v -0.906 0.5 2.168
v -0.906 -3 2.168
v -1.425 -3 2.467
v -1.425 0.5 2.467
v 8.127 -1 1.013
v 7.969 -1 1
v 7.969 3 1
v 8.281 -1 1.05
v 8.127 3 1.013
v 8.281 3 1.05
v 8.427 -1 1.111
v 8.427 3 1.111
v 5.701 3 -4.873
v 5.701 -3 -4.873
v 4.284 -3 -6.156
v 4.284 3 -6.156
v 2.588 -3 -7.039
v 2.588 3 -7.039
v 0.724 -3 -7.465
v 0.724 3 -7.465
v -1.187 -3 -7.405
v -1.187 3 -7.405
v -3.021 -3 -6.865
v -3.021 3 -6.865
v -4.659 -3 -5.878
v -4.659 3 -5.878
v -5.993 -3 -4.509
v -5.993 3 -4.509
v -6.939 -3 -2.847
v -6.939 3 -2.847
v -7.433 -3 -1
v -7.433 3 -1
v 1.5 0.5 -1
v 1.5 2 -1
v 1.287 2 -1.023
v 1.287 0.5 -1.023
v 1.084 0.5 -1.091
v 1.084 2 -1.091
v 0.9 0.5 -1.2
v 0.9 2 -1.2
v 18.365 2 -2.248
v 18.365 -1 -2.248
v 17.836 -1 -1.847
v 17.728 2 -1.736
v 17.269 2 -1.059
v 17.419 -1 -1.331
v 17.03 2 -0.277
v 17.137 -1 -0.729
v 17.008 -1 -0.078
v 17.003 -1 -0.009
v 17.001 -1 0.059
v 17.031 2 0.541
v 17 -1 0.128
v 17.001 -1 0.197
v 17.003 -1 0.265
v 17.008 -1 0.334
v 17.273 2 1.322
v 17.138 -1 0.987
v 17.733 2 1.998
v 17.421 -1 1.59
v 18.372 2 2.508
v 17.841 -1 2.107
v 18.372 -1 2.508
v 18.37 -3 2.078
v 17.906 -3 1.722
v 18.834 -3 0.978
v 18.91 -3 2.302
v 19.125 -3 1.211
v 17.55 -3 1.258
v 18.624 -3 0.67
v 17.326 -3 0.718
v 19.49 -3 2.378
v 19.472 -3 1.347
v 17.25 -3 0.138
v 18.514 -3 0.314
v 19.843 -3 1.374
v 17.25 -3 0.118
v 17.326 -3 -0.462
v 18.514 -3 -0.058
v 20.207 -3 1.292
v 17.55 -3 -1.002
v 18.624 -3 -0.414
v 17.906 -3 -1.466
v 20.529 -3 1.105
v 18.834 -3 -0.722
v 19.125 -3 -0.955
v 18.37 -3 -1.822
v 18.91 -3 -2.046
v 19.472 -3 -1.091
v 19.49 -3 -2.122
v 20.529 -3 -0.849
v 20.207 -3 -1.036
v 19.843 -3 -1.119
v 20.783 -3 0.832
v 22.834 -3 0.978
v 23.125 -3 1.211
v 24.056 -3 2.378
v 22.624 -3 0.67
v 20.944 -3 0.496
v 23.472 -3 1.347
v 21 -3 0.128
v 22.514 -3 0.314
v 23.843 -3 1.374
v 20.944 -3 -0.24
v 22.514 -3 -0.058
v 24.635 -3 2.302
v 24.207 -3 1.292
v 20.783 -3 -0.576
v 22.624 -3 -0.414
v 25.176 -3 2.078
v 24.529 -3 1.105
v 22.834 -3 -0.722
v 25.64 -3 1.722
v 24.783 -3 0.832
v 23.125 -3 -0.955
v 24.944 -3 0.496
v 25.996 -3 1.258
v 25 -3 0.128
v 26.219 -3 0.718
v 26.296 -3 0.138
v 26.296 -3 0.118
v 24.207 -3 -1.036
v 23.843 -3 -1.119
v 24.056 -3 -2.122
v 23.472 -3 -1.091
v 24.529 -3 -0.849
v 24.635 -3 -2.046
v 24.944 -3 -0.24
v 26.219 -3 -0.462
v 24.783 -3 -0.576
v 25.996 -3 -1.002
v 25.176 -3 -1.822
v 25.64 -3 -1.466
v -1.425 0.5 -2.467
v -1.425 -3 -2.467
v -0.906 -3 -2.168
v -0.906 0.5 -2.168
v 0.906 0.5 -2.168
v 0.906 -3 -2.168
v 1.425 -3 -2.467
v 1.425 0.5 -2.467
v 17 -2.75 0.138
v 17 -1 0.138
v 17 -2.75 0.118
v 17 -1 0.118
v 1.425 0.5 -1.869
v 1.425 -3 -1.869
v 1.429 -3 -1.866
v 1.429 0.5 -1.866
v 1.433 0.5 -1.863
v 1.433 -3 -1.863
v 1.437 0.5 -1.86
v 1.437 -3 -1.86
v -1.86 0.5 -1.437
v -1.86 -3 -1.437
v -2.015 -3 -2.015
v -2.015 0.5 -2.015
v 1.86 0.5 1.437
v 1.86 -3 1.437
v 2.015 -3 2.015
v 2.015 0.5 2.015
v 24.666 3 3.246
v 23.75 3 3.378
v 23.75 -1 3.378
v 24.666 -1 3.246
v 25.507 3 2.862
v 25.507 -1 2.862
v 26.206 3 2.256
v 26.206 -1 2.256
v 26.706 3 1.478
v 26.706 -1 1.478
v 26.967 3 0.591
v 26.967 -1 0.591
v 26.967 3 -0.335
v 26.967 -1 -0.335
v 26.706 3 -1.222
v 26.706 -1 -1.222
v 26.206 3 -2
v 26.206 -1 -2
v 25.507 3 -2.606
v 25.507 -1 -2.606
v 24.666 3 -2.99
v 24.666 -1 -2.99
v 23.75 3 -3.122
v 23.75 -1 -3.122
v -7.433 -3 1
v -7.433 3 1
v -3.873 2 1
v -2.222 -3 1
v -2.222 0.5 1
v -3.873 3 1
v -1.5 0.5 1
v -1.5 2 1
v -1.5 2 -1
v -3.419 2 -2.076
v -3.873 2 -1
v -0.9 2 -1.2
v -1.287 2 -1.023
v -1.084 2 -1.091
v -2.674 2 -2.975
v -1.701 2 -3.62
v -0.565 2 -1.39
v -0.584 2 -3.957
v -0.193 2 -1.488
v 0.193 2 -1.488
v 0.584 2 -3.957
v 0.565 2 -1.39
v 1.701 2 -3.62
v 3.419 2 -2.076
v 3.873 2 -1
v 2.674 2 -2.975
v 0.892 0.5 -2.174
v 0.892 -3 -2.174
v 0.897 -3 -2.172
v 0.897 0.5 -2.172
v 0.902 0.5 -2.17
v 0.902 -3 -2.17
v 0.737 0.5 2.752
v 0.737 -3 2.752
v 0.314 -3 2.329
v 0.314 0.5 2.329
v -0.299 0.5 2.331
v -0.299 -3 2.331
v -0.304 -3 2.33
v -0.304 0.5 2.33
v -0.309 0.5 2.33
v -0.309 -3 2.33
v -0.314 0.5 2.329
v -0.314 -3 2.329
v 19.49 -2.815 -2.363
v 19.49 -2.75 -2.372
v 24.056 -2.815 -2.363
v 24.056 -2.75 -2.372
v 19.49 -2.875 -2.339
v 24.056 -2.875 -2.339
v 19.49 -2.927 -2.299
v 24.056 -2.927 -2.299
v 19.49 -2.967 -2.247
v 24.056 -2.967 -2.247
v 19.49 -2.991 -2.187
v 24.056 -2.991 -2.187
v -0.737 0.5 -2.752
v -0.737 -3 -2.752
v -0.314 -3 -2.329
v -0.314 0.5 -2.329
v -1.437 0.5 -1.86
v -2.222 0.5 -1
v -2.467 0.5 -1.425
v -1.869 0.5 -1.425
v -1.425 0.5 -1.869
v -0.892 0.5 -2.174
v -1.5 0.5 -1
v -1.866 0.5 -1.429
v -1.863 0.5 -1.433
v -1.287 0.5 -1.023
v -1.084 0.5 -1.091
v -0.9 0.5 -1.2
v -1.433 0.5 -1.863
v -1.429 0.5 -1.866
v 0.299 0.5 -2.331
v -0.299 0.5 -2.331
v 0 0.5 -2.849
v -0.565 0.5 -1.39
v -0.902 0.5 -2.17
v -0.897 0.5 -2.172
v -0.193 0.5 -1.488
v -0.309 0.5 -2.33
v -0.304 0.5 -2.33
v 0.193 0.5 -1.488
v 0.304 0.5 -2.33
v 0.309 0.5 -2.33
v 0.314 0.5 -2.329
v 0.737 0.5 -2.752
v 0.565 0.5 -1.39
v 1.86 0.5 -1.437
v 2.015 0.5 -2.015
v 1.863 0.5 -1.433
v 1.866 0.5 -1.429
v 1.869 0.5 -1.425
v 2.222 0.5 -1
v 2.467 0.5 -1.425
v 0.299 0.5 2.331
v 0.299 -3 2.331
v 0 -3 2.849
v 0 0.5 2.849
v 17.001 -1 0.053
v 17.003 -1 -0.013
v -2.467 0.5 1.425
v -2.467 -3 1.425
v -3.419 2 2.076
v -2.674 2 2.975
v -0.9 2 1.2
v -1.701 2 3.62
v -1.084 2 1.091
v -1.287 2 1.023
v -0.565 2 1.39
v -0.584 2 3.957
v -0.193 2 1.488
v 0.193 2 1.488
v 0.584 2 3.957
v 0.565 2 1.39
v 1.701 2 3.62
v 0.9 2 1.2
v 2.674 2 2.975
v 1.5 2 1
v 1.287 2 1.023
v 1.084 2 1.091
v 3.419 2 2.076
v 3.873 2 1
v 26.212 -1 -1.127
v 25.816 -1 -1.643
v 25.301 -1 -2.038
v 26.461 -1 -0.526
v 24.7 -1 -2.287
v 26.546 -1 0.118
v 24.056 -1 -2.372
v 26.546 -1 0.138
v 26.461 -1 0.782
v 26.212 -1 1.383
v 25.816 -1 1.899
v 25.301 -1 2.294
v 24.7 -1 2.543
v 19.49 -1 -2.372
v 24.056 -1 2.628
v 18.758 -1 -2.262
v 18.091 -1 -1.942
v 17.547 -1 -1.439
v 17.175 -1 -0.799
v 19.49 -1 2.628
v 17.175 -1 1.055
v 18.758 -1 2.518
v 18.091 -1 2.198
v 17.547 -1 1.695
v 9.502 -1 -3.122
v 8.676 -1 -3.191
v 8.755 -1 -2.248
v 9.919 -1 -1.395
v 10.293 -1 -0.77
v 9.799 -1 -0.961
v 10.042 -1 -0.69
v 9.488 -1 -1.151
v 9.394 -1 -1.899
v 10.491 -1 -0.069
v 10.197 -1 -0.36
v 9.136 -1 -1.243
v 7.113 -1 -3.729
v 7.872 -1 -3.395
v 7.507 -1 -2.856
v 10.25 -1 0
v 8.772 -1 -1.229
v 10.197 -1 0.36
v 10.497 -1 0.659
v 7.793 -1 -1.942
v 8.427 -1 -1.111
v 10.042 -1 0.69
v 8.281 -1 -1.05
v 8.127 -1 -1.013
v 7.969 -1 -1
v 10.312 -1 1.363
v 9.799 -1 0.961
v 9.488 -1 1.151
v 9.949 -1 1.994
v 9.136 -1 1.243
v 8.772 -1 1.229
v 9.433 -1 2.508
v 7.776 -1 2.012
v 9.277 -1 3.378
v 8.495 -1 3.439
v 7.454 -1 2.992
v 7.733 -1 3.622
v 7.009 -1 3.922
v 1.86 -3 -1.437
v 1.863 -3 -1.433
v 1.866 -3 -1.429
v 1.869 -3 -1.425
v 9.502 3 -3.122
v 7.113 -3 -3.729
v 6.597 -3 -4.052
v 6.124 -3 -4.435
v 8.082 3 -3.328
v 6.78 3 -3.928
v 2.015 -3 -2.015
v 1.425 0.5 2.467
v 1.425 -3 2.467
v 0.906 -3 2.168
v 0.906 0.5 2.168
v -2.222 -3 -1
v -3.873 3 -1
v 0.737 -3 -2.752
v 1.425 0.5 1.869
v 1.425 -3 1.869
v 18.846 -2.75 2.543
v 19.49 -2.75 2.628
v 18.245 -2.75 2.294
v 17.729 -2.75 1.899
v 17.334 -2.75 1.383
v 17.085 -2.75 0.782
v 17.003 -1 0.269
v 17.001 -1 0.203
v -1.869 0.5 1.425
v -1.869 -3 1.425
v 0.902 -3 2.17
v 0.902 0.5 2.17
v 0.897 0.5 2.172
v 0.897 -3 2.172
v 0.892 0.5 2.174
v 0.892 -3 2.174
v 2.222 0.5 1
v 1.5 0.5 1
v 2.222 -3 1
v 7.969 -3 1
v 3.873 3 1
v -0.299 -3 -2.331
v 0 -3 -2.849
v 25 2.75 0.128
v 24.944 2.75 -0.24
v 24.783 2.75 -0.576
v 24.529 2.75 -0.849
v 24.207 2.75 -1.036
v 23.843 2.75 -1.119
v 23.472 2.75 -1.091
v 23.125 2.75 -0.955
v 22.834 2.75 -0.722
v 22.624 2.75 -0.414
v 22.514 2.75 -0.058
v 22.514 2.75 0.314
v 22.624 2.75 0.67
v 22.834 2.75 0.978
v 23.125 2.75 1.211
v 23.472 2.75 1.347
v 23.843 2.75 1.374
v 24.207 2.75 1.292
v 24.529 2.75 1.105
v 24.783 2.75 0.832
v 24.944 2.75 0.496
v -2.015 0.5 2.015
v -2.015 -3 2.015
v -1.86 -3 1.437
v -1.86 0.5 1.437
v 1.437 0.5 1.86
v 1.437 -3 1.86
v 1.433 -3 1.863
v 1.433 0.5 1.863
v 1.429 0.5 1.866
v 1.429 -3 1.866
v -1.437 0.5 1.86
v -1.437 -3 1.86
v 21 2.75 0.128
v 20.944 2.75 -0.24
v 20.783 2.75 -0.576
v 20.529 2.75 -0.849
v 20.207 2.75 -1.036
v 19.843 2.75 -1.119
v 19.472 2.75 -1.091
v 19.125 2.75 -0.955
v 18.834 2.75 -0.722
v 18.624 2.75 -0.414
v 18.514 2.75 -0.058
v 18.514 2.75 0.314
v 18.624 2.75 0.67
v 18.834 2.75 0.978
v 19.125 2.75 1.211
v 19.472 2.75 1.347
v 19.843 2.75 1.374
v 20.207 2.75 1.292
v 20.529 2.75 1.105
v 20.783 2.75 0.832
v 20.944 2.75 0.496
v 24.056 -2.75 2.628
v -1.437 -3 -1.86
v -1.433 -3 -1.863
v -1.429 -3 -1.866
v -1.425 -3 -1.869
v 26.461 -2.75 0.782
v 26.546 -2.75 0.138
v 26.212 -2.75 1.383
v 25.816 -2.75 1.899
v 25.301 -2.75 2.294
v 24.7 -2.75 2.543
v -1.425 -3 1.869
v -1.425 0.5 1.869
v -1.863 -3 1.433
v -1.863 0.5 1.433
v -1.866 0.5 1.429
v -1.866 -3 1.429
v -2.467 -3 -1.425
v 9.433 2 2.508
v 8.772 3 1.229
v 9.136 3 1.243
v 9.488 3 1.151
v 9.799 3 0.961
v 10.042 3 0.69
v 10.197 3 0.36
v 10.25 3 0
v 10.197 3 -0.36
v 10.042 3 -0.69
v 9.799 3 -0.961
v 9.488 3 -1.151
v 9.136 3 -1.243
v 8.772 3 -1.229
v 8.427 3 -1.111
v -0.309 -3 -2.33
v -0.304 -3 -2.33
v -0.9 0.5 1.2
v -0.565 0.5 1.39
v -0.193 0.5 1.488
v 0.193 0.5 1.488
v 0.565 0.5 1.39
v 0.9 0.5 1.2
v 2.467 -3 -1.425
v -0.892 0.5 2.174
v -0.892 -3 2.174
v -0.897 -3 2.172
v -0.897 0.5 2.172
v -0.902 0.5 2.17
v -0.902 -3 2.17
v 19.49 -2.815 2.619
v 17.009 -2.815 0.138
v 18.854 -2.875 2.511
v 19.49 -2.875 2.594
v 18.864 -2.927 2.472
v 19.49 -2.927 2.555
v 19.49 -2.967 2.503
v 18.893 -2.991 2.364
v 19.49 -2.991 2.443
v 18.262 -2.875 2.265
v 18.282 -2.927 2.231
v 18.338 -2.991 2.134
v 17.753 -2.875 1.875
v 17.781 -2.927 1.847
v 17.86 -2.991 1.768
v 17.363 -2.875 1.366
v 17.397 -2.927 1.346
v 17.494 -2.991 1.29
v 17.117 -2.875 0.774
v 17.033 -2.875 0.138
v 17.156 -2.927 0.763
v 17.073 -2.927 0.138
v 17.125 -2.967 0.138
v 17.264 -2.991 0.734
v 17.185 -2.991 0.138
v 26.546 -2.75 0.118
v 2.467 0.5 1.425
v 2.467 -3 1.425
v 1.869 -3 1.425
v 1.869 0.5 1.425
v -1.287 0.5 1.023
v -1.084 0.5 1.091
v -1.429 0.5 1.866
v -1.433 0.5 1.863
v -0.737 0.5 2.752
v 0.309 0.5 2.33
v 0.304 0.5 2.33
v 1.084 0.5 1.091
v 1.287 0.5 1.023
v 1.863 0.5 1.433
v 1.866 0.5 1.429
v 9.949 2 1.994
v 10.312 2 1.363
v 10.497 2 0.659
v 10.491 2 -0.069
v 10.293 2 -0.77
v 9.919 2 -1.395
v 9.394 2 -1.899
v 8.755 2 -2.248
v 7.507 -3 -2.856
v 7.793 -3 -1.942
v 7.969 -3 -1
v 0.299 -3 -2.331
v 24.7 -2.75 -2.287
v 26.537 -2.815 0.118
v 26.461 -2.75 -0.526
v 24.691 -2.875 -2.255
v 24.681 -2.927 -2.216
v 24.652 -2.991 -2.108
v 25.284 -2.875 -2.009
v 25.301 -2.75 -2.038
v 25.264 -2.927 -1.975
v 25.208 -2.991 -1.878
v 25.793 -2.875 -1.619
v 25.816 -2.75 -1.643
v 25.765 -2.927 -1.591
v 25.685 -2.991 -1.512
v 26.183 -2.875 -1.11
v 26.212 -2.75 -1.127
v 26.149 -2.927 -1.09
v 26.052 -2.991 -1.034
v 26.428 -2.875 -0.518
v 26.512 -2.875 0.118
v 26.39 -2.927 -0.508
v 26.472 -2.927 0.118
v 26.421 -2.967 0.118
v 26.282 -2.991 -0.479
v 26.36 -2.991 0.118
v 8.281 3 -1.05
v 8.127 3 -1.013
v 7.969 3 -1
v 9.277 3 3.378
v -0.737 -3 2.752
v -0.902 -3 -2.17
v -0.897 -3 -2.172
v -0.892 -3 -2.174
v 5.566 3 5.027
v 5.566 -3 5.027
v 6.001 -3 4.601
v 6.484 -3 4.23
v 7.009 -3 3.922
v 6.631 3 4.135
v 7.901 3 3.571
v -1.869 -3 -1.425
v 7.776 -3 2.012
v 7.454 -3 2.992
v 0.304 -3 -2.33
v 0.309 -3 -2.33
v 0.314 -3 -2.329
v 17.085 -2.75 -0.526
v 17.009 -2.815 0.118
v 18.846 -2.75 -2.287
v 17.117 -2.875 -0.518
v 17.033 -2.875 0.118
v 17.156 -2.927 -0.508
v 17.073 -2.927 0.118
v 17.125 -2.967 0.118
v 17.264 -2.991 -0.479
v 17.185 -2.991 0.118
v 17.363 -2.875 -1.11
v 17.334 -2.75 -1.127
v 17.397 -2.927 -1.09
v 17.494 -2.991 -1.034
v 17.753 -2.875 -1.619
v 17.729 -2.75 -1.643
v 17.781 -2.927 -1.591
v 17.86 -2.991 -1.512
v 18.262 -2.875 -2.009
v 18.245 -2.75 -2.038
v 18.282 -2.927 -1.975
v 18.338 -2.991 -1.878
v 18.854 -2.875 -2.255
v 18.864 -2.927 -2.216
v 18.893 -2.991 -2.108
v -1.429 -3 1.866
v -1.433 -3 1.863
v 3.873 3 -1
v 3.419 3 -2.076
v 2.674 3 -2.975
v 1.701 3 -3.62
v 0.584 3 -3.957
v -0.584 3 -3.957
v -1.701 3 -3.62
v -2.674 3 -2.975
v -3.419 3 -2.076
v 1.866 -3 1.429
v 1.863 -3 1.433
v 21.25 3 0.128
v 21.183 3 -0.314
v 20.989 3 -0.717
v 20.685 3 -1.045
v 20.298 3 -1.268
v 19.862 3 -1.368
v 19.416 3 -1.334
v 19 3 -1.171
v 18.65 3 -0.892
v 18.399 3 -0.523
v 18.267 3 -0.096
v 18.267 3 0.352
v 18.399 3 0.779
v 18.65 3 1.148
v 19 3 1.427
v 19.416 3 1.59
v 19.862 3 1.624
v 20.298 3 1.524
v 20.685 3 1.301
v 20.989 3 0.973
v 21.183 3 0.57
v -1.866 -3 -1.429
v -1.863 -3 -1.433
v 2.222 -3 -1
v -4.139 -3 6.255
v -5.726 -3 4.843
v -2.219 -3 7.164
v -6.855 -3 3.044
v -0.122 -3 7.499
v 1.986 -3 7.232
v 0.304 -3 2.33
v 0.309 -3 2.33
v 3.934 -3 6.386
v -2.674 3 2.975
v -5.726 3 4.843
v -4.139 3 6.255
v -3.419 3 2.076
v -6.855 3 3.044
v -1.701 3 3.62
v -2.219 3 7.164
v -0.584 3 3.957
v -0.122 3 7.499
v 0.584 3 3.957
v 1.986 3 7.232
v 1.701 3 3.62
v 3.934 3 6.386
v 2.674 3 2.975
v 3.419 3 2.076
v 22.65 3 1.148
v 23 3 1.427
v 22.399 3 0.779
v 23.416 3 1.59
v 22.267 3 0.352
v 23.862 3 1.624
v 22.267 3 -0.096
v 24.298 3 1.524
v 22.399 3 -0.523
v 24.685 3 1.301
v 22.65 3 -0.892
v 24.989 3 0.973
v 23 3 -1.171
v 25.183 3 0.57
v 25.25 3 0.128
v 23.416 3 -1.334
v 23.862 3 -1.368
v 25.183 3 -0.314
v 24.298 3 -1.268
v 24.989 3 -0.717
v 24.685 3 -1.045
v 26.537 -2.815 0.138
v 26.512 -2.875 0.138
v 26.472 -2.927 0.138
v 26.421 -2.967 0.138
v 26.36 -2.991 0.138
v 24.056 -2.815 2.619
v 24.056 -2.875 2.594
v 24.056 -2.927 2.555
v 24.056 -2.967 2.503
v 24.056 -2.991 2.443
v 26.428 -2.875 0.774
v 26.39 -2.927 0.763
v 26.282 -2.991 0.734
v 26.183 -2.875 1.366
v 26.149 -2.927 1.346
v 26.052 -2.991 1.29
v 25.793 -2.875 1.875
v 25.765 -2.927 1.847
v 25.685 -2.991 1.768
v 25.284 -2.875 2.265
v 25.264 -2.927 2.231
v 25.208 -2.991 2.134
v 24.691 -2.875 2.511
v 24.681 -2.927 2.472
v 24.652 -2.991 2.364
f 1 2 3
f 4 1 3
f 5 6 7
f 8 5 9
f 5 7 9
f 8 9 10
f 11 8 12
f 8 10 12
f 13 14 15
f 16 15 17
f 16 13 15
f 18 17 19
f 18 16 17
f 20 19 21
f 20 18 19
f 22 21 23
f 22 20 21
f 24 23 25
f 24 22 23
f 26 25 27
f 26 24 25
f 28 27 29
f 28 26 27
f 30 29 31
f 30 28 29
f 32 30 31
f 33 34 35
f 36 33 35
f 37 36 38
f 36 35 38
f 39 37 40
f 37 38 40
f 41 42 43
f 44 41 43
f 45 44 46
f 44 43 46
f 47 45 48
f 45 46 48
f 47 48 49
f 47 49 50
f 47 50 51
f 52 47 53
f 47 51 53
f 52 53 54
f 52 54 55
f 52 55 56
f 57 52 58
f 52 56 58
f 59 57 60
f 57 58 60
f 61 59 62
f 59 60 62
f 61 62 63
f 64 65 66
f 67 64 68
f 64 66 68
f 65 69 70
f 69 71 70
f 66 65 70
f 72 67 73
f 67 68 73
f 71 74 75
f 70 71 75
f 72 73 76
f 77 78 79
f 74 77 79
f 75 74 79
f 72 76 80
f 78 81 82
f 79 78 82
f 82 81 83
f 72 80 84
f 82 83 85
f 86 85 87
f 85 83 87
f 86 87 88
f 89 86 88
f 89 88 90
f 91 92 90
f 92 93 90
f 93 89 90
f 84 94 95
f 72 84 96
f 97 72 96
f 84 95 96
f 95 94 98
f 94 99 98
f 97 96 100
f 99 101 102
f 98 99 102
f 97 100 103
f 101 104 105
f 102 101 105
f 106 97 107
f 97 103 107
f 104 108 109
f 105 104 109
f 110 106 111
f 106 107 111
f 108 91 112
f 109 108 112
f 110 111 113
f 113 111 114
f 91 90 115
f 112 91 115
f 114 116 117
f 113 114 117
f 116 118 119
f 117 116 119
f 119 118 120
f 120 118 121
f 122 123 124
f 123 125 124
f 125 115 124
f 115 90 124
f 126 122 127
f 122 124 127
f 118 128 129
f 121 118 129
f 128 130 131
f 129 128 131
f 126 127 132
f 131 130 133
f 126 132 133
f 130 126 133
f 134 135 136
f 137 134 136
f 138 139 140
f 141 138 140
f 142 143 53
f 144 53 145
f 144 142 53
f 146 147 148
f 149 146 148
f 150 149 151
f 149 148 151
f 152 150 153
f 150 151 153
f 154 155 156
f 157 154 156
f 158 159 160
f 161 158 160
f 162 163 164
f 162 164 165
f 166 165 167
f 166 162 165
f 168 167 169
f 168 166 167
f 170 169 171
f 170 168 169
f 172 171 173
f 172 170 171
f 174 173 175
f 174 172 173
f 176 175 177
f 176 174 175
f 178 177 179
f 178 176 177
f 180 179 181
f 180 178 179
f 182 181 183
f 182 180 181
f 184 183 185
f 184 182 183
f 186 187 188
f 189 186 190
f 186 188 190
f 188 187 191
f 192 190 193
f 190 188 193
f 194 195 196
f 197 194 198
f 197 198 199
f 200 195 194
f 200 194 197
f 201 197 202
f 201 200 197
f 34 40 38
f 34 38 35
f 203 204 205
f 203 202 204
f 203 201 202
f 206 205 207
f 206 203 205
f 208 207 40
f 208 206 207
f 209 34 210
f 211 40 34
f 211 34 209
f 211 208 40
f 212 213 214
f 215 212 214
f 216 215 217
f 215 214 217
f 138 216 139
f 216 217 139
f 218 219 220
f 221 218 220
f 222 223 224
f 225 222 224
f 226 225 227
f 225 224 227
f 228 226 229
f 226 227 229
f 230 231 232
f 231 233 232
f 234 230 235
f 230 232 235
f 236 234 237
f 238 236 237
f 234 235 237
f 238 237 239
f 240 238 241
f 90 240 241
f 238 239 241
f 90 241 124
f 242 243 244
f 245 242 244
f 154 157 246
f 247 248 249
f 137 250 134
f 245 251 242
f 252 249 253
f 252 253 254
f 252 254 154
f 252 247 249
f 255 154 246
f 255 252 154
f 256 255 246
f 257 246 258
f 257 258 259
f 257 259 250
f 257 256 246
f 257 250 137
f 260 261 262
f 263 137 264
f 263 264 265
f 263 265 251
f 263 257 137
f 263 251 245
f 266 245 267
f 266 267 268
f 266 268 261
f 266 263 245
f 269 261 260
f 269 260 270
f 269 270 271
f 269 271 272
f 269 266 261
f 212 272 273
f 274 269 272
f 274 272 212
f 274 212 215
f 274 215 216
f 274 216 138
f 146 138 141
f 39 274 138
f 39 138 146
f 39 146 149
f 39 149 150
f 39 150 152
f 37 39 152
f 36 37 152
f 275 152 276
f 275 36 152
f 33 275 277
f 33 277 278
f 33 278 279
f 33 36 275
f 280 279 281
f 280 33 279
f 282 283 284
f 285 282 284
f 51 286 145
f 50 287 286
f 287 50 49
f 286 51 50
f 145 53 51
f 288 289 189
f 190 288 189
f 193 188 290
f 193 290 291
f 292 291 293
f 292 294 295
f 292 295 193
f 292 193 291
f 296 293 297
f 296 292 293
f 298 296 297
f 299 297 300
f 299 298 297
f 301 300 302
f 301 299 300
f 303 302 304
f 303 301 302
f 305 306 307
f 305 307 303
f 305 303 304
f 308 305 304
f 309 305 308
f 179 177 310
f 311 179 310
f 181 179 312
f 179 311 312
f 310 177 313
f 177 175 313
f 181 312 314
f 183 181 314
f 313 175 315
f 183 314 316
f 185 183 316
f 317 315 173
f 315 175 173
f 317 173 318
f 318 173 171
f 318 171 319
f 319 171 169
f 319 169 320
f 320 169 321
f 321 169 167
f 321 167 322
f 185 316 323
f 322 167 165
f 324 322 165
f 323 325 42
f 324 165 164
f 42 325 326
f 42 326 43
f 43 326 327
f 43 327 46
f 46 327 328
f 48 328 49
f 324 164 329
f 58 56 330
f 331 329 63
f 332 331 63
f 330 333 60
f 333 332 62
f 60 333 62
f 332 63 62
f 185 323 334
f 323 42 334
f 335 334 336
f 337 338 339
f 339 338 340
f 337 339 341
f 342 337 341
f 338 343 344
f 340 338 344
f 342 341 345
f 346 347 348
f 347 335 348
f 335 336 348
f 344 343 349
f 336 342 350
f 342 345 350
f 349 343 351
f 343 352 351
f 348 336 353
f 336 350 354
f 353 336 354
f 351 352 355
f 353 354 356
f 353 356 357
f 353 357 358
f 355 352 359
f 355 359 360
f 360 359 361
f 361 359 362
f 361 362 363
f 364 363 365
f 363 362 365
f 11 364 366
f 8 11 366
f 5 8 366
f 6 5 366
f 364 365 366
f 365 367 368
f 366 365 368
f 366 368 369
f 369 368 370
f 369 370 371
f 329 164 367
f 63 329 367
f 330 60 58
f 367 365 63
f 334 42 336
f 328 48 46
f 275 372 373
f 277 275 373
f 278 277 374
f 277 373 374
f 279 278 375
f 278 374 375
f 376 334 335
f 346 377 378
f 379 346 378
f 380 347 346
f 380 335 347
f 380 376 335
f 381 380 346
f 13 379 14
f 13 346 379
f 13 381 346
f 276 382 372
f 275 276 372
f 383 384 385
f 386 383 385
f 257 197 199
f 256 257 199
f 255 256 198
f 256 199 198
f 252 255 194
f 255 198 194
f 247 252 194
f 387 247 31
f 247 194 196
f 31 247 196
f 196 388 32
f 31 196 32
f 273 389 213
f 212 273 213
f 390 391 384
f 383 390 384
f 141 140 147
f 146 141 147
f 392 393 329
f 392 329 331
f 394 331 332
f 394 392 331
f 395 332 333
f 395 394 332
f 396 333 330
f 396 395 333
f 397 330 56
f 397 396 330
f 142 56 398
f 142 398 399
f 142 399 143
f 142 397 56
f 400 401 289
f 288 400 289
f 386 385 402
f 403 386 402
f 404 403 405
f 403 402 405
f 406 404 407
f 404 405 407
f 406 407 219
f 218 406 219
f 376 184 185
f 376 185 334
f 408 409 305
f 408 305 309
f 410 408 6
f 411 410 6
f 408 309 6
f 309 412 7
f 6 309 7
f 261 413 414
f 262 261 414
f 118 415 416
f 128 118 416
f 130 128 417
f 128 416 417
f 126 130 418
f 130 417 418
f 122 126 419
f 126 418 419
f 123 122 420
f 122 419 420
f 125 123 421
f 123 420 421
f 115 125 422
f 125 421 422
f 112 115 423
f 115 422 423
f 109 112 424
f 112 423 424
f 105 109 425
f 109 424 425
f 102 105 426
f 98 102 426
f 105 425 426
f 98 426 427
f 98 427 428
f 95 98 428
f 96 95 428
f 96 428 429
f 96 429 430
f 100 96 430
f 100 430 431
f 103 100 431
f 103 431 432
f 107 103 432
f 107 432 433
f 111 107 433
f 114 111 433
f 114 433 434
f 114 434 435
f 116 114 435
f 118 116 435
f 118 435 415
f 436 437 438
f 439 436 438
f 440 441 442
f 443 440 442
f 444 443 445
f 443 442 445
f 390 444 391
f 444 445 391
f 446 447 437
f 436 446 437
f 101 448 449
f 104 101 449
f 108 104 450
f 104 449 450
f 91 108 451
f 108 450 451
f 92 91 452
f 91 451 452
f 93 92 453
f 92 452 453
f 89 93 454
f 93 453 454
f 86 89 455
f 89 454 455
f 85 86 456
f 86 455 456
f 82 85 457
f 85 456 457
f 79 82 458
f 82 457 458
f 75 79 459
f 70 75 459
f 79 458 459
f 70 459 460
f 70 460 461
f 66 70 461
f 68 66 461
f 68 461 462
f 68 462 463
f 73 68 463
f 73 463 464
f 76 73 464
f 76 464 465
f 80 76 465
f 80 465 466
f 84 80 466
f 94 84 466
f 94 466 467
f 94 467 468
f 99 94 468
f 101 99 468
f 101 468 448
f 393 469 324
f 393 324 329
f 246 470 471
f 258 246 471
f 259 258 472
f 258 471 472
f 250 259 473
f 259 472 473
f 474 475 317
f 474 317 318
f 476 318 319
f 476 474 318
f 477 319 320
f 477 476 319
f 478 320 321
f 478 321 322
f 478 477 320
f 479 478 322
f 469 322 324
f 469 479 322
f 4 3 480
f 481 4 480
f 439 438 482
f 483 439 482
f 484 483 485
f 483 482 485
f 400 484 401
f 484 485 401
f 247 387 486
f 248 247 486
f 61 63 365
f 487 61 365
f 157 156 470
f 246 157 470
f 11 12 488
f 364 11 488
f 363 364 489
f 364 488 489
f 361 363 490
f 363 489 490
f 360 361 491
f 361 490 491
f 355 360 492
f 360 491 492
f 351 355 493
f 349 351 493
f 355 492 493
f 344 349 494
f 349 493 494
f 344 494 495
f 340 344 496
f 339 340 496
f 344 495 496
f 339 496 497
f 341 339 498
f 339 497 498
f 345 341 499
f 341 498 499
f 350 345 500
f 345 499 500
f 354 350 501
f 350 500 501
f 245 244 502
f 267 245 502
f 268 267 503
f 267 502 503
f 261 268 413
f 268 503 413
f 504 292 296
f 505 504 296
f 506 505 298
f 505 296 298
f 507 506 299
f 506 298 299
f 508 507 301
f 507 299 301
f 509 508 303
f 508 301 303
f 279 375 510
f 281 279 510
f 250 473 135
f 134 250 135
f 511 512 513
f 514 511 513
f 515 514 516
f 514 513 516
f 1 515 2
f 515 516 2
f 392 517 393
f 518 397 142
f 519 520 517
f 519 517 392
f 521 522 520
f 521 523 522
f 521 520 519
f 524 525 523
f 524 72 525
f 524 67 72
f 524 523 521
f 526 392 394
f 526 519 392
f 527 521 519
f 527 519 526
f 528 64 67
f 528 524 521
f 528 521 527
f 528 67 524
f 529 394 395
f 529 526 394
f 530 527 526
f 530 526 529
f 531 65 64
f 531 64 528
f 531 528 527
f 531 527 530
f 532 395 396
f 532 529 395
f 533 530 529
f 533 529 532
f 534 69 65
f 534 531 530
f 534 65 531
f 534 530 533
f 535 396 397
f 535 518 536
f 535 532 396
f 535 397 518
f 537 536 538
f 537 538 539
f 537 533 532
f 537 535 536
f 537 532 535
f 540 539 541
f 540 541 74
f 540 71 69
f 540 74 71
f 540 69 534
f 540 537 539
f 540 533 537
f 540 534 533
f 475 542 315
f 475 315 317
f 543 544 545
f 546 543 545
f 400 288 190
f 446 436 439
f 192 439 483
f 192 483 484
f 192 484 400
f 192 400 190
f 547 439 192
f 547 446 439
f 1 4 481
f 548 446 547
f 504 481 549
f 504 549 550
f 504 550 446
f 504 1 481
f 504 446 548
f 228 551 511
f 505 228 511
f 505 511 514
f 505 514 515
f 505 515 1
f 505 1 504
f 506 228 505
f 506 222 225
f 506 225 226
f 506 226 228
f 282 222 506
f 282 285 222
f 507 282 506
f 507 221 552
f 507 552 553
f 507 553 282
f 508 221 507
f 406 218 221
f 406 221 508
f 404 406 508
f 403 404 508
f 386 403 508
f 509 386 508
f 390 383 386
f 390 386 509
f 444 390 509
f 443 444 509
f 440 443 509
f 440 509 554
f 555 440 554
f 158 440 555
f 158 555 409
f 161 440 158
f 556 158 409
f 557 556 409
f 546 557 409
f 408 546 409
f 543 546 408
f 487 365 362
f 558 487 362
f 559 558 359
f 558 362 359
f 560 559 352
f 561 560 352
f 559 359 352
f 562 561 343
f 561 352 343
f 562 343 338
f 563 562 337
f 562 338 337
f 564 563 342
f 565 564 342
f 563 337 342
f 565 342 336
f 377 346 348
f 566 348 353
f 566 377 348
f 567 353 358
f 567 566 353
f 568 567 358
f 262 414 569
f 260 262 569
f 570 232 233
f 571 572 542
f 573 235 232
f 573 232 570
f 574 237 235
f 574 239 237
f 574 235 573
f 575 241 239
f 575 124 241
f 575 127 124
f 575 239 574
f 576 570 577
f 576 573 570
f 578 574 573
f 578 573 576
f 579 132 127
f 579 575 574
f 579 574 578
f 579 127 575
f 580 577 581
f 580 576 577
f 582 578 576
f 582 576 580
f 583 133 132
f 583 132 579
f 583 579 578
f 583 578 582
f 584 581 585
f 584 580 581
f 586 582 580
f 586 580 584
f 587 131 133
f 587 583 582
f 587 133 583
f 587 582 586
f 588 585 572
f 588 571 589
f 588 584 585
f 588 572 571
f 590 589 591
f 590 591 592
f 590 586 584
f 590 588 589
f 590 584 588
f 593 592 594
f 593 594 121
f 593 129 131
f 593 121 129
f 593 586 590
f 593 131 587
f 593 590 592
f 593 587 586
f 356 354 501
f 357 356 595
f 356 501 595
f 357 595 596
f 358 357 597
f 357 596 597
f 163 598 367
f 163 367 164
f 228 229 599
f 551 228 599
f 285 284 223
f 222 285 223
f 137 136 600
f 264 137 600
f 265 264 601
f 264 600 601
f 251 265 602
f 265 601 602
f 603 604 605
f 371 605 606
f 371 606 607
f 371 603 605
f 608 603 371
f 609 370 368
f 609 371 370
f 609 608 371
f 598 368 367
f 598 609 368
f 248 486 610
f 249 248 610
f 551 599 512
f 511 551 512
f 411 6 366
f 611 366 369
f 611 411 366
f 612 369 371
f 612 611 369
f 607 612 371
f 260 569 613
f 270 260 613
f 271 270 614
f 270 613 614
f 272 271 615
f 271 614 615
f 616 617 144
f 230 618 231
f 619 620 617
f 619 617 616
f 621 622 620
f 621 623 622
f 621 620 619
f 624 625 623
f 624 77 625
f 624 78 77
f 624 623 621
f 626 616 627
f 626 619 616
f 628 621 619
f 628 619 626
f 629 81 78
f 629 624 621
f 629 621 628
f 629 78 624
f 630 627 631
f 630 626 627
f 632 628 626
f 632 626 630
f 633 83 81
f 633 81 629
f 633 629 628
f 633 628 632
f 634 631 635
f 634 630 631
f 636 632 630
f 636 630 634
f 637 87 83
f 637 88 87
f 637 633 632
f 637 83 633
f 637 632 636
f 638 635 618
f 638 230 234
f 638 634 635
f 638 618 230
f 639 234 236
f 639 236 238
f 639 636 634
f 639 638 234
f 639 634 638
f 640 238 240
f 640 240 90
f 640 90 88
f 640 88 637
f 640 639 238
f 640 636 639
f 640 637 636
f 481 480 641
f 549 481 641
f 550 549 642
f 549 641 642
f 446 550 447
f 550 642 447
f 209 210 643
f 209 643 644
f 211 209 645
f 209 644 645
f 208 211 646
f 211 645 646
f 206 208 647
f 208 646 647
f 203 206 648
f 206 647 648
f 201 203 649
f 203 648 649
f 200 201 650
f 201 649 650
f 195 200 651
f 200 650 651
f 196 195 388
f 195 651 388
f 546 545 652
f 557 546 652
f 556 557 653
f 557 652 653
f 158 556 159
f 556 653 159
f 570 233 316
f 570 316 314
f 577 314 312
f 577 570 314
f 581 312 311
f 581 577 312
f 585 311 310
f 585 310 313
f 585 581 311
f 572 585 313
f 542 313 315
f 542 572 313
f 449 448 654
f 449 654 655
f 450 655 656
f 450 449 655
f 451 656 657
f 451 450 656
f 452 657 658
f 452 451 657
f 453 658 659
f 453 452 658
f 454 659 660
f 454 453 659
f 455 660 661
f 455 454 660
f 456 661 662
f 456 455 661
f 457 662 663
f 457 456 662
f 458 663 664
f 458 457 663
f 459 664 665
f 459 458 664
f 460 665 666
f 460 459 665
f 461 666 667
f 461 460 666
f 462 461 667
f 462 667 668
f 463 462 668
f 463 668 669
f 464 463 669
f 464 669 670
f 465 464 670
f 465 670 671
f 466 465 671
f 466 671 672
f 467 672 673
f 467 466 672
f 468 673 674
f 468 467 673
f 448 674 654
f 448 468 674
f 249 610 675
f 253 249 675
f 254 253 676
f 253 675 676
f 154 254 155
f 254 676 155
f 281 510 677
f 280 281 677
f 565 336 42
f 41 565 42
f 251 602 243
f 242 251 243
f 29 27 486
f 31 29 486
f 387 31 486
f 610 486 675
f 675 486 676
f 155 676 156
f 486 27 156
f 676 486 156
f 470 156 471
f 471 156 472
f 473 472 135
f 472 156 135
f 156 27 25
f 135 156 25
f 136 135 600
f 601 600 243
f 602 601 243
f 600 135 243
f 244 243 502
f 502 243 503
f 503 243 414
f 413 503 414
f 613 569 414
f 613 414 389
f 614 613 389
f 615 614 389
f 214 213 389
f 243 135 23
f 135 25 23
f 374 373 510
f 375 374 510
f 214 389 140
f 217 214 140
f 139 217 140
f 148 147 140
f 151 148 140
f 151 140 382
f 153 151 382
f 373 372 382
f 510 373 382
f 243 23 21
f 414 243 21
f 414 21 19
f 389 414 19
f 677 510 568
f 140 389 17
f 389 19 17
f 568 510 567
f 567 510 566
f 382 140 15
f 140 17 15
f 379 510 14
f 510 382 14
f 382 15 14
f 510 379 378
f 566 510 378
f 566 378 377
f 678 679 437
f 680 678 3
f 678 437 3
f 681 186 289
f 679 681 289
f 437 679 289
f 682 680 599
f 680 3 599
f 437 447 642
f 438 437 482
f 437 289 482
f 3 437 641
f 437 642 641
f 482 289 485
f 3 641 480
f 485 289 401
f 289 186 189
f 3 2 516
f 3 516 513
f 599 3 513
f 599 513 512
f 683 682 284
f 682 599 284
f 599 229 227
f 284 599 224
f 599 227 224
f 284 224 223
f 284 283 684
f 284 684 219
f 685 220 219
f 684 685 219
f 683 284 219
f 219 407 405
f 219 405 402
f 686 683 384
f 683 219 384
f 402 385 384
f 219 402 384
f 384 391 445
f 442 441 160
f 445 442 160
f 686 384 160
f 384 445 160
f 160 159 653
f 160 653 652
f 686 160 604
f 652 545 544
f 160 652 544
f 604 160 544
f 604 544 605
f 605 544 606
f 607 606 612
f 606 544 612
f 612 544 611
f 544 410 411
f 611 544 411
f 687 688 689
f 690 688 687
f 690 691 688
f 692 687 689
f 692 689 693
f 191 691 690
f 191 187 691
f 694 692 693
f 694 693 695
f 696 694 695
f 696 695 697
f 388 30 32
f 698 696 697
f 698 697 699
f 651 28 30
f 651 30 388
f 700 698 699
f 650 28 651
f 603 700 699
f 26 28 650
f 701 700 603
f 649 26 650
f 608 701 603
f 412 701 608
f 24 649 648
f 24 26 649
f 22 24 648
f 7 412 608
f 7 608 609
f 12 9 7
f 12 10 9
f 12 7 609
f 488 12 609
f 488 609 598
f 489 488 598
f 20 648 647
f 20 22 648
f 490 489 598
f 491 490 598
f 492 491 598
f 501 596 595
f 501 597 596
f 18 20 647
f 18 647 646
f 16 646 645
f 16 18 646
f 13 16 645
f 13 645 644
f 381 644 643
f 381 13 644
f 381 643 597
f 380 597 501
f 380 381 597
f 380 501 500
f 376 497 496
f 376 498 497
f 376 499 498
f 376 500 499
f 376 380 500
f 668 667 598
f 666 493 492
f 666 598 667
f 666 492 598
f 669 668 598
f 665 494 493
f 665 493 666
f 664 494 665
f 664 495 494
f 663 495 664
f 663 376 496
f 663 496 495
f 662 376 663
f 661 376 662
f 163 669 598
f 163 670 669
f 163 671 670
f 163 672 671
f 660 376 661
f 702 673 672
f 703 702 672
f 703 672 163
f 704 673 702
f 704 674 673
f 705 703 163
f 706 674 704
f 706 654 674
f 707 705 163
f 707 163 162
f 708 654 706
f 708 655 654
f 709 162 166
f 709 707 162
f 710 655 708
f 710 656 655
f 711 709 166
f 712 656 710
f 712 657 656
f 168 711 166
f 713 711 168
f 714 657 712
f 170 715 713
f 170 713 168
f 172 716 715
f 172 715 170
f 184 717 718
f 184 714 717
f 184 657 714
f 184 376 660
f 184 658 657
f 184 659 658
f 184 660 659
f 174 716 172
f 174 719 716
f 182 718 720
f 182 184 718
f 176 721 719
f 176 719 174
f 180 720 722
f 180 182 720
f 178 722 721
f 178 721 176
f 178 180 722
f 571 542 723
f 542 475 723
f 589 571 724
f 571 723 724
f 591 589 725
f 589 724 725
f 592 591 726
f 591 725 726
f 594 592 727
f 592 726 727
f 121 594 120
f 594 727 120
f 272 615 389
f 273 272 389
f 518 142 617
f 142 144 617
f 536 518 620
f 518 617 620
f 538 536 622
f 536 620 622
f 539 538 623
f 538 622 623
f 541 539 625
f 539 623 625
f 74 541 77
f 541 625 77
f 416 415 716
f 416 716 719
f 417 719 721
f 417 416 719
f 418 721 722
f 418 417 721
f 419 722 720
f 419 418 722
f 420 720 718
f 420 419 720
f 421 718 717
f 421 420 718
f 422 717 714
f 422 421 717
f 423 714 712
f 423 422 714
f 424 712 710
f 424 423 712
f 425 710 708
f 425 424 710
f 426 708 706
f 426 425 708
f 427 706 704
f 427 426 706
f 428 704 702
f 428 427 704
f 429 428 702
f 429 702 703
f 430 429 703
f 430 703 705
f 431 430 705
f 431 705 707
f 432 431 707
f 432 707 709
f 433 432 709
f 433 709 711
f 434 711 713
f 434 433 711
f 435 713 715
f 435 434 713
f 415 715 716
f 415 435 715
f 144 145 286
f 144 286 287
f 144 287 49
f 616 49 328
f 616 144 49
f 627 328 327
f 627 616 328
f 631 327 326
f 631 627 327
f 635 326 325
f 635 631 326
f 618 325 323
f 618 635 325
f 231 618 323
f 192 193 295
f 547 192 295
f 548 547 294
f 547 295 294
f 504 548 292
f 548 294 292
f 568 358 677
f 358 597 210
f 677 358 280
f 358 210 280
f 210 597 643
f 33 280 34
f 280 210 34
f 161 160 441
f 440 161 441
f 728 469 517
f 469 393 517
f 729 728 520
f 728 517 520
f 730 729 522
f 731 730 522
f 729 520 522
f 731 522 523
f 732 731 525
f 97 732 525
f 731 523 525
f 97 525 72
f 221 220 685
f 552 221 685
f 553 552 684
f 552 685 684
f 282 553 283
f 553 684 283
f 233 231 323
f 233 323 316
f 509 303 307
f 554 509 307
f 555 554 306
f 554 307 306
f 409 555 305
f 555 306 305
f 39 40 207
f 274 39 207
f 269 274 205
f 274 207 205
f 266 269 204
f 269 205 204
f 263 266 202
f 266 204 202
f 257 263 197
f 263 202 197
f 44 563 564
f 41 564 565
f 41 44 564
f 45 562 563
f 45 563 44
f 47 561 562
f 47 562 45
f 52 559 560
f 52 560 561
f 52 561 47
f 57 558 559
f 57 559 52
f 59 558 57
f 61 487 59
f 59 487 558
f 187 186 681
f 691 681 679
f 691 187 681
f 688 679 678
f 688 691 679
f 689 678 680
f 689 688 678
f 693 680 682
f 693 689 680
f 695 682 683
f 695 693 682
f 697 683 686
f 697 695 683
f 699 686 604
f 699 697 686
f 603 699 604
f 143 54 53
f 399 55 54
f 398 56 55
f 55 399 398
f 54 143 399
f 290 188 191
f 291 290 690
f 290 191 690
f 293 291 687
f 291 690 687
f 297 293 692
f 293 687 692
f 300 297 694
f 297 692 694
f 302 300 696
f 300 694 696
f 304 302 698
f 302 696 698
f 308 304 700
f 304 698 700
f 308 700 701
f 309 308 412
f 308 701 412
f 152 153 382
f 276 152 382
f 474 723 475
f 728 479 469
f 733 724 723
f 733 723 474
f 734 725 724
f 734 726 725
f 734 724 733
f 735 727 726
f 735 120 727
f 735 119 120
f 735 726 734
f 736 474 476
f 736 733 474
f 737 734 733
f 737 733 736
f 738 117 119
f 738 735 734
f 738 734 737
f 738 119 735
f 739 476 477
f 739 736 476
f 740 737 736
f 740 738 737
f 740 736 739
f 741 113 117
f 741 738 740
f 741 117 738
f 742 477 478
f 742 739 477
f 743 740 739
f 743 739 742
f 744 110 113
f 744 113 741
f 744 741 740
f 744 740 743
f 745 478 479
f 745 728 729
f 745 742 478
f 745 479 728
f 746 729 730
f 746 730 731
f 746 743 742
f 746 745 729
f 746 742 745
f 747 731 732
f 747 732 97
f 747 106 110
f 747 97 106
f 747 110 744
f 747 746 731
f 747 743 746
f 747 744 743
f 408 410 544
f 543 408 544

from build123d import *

# Parameters (mm, degrees)
BOSS_EXTRUDE1_DEPTH = 3
SKETCH2_R           = 1.25
CUT_EXTRUDE1_DEPTH  = 16
CHAMFER1_SIZE       = 0.25
SKETCH3_R           = 4
CUT_EXTRUDE2_DEPTH  = 1
CUT_EXTRUDE3_DEPTH  = 11
CUT_EXTRUDE4_DEPTH  = 2
FILLET1_R           = 0.25
CUT_EXTRUDE5_DEPTH  = 3
SKETCH7_R           = 2.35
CUT_EXTRUDE6_DEPTH  = 3.5
CUT_EXTRUDE7_DEPTH  = 3.5
CIRPATTERN1_COUNT   = 24


with BuildPart() as part:
    # Sketch1 → Boss-Extrude1 (new body, symmetric)
    with BuildSketch(Plane(origin=(0, 0, 0), x_dir=(1, 0, 0), z_dir=(0, 1, 0))):
        with BuildLine():
            Line((23.75, 3.122009569), (9.501734608, 3.122009569))
            ThreePointArc((9.501734608, 3.122009569), (7.409369814, 3.580863286), (5.701040765, 4.873205742))
            ThreePointArc((5.701040765, 4.873205742), (-7.499303275, 0.102227183), (5.566088347, -5.026794258))
            ThreePointArc((5.566088347, -5.026794258), (7.246540637, -3.808746464), (9.276813911, -3.377990431))
            Line((9.276813911, -3.377990431), (23.75, -3.377990431))
            ThreePointArc((23.75, -3.377990431), (27, -0.127990431), (23.75, 3.122009569))
        make_face()
    extrude(amount=BOSS_EXTRUDE1_DEPTH, both=True)

    # Sketch2 → Cut-Extrude1 (cut)
    with BuildSketch(Plane(origin=(0, 3, 0), x_dir=(1, 0, 0), z_dir=(0, 1, 0))):
        with Locations((23.75, -0.127990431)):
            Circle(SKETCH2_R)
        with Locations((19.75, -0.127990431)):
            Circle(SKETCH2_R)
    extrude(amount=-CUT_EXTRUDE1_DEPTH, mode=Mode.SUBTRACT)

    # Chamfer1
    chamfer1_edges = [part.edges().sort_by_distance(p)[0] for p in [
        (22.5, 3, 0.127990431),
        (18.5, 3, 0.127990431),
    ]]
    chamfer(chamfer1_edges, length=CHAMFER1_SIZE)

    # Sketch3 → Cut-Extrude2 (cut)
    with BuildSketch(Plane(origin=(0, 3, 0), x_dir=(1, 0, 0), z_dir=(0, 1, 0))):
        Circle(SKETCH3_R)
    extrude(amount=-CUT_EXTRUDE2_DEPTH, mode=Mode.SUBTRACT)

    # Sketch4 → Cut-Extrude3 (cut)
    with BuildSketch(Plane(origin=(0, 3, 0), x_dir=(1, 0, 0), z_dir=(0, 1, 0))):
        with BuildLine():
            Line((-1.5, 1), (-9, 1))
            Line((-9, 1), (-9, -1))
            Line((-9, -1), (-1.5, -1))
            ThreePointArc((-1.5, -1), (-1.183772234, -1.051316702), (-0.9, -1.2))
            ThreePointArc((-0.9, -1.2), (0, -1.5), (0.9, -1.2))
            ThreePointArc((0.9, -1.2), (1.183772234, -1.051316702), (1.5, -1))
            Line((1.5, -1), (7.969223594, -1))
            ThreePointArc((7.969223594, -1), (8.204925854, -1.028174684), (8.427346441, -1.111111111))
            ThreePointArc((8.427346441, -1.111111111), (10.25, 0), (8.427346441, 1.111111111))
            ThreePointArc((8.427346441, 1.111111111), (8.204925854, 1.028174684), (7.969223594, 1))
            Line((7.969223594, 1), (1.5, 1))
            ThreePointArc((1.5, 1), (1.183772234, 1.051316702), (0.9, 1.2))
            ThreePointArc((0.9, 1.2), (0, 1.5), (-0.9, 1.2))
            ThreePointArc((-0.9, 1.2), (-1.183772234, 1.051316702), (-1.5, 1))
        make_face()
    extrude(amount=-CUT_EXTRUDE3_DEPTH, mode=Mode.SUBTRACT)

    # Sketch5 → Cut-Extrude4 (cut)
    with BuildSketch(Plane.XZ.offset(3)):
        with BuildLine():
            Line((24.055684797, -4.372009569), (19.49, -4.372009569))
            Line((19.49, -4.372009569), (6.737511188, -4.372009569))
            ThreePointArc((6.737511188, -4.372009569), (8.030233116, 0.154534121), (6.564314835, 4.627990431))
            Line((6.564314835, 4.627990431), (19.49, 4.627990431))
            Line((19.49, 4.627990431), (24.055684797, 4.627990431))
            ThreePointArc((24.055684797, 4.627990431), (27.230594245, 3.312899878), (28.545684797, 0.137990431))
            Line((28.545684797, 0.137990431), (28.545684797, 0.117990431))
            ThreePointArc((28.545684797, 0.117990431), (27.230594245, -3.056919017), (24.055684797, -4.372009569))
        make_face()
        with BuildLine():
            Line((24.055684797, 2.627990431), (19.49, 2.627990431))
            ThreePointArc((19.49, 2.627990431), (17.729304115, 1.898686316), (17, 0.137990431))
            Line((17, 0.137990431), (17, 0.117990431))
            ThreePointArc((17, 0.117990431), (17.729304115, -1.642705455), (19.49, -2.372009569))
            Line((19.49, -2.372009569), (24.055684797, -2.372009569))
            ThreePointArc((24.055684797, -2.372009569), (25.816380683, -1.642705455), (26.545684797, 0.117990431))
            Line((26.545684797, 0.117990431), (26.545684797, 0.137990431))
            ThreePointArc((26.545684797, 0.137990431), (25.816380683, 1.898686316), (24.055684797, 2.627990431))
        make_face(mode=Mode.SUBTRACT)
    extrude(amount=-CUT_EXTRUDE4_DEPTH, mode=Mode.SUBTRACT)

    # Fillet1
    fillet1_edges = [part.edges().sort_by_distance(p)[0] for p in [
        (25.816380683, -3, -1.642705455),
        (21.772842399, -3, -2.372009569),
        (17.729304115, -3, -1.642705455),
        (17, -3, 0.127990431),
        (17.729304115, -3, 1.898686316),
        (21.772842399, -3, 2.627990431),
        (25.816380683, -3, 1.898686316),
        (26.545684797, -3, 0.127990431),
    ]]
    fillet(fillet1_edges, radius=FILLET1_R)

    # Sketch6 → Cut-Extrude5 (cut)
    with BuildSketch(Plane.XZ.offset(1)):
        with BuildLine():
            Line((16.572326108, 2.507990431), (10.678705054, 2.507990431))
            Line((10.678705054, 2.507990431), (9.432782088, 2.507990431))
            ThreePointArc((9.432782088, 2.507990431), (10.490779488, -0.069105379), (8.754910472, -2.247990431))
            Line((8.754910472, -2.247990431), (10.678705054, -2.247990431))
            Line((10.678705054, -2.247990431), (16.572326108, -2.247990431))
            Line((16.572326108, -2.247990431), (18.365364688, -2.247990431))
            ThreePointArc((18.365364688, -2.247990431), (17.000002911, 0.131991595), (18.3722845, 2.507990431))
            Line((18.3722845, 2.507990431), (16.572326108, 2.507990431))
        make_face()
    extrude(amount=-CUT_EXTRUDE5_DEPTH, mode=Mode.SUBTRACT)

    # Sketch7 → Cut-Extrude6 (cut)
    with BuildSketch(Plane.XZ.offset(3)):
        Circle(SKETCH7_R)
    extrude(amount=-CUT_EXTRUDE6_DEPTH, mode=Mode.SUBTRACT)

    # Sketch8 → Cut-Extrude7 (cut)
    with BuildSketch(Plane.XZ.offset(3)):
        with BuildLine():
            ThreePointArc((-0.299151371, 2.330881476), (0, 2.35), (0.299151371, 2.330881476))
            Line((0.299151371, 2.330881476), (0, 2.84902685))
            Line((0, 2.84902685), (-0.299151371, 2.330881476))
        make_face()
    cut_extrude7 = extrude(amount=-CUT_EXTRUDE7_DEPTH, mode=Mode.SUBTRACT)

    # CirPattern1: Cut-Extrude7 ×24 about axis
    cirpattern1_axis = Axis((0, 0, 0), (0, 1, 0))
    for i in range(1, CIRPATTERN1_COUNT):
        add(cut_extrude7.rotate(cirpattern1_axis, i * 360 / CIRPATTERN1_COUNT), mode=Mode.SUBTRACT)


solid = part.part
